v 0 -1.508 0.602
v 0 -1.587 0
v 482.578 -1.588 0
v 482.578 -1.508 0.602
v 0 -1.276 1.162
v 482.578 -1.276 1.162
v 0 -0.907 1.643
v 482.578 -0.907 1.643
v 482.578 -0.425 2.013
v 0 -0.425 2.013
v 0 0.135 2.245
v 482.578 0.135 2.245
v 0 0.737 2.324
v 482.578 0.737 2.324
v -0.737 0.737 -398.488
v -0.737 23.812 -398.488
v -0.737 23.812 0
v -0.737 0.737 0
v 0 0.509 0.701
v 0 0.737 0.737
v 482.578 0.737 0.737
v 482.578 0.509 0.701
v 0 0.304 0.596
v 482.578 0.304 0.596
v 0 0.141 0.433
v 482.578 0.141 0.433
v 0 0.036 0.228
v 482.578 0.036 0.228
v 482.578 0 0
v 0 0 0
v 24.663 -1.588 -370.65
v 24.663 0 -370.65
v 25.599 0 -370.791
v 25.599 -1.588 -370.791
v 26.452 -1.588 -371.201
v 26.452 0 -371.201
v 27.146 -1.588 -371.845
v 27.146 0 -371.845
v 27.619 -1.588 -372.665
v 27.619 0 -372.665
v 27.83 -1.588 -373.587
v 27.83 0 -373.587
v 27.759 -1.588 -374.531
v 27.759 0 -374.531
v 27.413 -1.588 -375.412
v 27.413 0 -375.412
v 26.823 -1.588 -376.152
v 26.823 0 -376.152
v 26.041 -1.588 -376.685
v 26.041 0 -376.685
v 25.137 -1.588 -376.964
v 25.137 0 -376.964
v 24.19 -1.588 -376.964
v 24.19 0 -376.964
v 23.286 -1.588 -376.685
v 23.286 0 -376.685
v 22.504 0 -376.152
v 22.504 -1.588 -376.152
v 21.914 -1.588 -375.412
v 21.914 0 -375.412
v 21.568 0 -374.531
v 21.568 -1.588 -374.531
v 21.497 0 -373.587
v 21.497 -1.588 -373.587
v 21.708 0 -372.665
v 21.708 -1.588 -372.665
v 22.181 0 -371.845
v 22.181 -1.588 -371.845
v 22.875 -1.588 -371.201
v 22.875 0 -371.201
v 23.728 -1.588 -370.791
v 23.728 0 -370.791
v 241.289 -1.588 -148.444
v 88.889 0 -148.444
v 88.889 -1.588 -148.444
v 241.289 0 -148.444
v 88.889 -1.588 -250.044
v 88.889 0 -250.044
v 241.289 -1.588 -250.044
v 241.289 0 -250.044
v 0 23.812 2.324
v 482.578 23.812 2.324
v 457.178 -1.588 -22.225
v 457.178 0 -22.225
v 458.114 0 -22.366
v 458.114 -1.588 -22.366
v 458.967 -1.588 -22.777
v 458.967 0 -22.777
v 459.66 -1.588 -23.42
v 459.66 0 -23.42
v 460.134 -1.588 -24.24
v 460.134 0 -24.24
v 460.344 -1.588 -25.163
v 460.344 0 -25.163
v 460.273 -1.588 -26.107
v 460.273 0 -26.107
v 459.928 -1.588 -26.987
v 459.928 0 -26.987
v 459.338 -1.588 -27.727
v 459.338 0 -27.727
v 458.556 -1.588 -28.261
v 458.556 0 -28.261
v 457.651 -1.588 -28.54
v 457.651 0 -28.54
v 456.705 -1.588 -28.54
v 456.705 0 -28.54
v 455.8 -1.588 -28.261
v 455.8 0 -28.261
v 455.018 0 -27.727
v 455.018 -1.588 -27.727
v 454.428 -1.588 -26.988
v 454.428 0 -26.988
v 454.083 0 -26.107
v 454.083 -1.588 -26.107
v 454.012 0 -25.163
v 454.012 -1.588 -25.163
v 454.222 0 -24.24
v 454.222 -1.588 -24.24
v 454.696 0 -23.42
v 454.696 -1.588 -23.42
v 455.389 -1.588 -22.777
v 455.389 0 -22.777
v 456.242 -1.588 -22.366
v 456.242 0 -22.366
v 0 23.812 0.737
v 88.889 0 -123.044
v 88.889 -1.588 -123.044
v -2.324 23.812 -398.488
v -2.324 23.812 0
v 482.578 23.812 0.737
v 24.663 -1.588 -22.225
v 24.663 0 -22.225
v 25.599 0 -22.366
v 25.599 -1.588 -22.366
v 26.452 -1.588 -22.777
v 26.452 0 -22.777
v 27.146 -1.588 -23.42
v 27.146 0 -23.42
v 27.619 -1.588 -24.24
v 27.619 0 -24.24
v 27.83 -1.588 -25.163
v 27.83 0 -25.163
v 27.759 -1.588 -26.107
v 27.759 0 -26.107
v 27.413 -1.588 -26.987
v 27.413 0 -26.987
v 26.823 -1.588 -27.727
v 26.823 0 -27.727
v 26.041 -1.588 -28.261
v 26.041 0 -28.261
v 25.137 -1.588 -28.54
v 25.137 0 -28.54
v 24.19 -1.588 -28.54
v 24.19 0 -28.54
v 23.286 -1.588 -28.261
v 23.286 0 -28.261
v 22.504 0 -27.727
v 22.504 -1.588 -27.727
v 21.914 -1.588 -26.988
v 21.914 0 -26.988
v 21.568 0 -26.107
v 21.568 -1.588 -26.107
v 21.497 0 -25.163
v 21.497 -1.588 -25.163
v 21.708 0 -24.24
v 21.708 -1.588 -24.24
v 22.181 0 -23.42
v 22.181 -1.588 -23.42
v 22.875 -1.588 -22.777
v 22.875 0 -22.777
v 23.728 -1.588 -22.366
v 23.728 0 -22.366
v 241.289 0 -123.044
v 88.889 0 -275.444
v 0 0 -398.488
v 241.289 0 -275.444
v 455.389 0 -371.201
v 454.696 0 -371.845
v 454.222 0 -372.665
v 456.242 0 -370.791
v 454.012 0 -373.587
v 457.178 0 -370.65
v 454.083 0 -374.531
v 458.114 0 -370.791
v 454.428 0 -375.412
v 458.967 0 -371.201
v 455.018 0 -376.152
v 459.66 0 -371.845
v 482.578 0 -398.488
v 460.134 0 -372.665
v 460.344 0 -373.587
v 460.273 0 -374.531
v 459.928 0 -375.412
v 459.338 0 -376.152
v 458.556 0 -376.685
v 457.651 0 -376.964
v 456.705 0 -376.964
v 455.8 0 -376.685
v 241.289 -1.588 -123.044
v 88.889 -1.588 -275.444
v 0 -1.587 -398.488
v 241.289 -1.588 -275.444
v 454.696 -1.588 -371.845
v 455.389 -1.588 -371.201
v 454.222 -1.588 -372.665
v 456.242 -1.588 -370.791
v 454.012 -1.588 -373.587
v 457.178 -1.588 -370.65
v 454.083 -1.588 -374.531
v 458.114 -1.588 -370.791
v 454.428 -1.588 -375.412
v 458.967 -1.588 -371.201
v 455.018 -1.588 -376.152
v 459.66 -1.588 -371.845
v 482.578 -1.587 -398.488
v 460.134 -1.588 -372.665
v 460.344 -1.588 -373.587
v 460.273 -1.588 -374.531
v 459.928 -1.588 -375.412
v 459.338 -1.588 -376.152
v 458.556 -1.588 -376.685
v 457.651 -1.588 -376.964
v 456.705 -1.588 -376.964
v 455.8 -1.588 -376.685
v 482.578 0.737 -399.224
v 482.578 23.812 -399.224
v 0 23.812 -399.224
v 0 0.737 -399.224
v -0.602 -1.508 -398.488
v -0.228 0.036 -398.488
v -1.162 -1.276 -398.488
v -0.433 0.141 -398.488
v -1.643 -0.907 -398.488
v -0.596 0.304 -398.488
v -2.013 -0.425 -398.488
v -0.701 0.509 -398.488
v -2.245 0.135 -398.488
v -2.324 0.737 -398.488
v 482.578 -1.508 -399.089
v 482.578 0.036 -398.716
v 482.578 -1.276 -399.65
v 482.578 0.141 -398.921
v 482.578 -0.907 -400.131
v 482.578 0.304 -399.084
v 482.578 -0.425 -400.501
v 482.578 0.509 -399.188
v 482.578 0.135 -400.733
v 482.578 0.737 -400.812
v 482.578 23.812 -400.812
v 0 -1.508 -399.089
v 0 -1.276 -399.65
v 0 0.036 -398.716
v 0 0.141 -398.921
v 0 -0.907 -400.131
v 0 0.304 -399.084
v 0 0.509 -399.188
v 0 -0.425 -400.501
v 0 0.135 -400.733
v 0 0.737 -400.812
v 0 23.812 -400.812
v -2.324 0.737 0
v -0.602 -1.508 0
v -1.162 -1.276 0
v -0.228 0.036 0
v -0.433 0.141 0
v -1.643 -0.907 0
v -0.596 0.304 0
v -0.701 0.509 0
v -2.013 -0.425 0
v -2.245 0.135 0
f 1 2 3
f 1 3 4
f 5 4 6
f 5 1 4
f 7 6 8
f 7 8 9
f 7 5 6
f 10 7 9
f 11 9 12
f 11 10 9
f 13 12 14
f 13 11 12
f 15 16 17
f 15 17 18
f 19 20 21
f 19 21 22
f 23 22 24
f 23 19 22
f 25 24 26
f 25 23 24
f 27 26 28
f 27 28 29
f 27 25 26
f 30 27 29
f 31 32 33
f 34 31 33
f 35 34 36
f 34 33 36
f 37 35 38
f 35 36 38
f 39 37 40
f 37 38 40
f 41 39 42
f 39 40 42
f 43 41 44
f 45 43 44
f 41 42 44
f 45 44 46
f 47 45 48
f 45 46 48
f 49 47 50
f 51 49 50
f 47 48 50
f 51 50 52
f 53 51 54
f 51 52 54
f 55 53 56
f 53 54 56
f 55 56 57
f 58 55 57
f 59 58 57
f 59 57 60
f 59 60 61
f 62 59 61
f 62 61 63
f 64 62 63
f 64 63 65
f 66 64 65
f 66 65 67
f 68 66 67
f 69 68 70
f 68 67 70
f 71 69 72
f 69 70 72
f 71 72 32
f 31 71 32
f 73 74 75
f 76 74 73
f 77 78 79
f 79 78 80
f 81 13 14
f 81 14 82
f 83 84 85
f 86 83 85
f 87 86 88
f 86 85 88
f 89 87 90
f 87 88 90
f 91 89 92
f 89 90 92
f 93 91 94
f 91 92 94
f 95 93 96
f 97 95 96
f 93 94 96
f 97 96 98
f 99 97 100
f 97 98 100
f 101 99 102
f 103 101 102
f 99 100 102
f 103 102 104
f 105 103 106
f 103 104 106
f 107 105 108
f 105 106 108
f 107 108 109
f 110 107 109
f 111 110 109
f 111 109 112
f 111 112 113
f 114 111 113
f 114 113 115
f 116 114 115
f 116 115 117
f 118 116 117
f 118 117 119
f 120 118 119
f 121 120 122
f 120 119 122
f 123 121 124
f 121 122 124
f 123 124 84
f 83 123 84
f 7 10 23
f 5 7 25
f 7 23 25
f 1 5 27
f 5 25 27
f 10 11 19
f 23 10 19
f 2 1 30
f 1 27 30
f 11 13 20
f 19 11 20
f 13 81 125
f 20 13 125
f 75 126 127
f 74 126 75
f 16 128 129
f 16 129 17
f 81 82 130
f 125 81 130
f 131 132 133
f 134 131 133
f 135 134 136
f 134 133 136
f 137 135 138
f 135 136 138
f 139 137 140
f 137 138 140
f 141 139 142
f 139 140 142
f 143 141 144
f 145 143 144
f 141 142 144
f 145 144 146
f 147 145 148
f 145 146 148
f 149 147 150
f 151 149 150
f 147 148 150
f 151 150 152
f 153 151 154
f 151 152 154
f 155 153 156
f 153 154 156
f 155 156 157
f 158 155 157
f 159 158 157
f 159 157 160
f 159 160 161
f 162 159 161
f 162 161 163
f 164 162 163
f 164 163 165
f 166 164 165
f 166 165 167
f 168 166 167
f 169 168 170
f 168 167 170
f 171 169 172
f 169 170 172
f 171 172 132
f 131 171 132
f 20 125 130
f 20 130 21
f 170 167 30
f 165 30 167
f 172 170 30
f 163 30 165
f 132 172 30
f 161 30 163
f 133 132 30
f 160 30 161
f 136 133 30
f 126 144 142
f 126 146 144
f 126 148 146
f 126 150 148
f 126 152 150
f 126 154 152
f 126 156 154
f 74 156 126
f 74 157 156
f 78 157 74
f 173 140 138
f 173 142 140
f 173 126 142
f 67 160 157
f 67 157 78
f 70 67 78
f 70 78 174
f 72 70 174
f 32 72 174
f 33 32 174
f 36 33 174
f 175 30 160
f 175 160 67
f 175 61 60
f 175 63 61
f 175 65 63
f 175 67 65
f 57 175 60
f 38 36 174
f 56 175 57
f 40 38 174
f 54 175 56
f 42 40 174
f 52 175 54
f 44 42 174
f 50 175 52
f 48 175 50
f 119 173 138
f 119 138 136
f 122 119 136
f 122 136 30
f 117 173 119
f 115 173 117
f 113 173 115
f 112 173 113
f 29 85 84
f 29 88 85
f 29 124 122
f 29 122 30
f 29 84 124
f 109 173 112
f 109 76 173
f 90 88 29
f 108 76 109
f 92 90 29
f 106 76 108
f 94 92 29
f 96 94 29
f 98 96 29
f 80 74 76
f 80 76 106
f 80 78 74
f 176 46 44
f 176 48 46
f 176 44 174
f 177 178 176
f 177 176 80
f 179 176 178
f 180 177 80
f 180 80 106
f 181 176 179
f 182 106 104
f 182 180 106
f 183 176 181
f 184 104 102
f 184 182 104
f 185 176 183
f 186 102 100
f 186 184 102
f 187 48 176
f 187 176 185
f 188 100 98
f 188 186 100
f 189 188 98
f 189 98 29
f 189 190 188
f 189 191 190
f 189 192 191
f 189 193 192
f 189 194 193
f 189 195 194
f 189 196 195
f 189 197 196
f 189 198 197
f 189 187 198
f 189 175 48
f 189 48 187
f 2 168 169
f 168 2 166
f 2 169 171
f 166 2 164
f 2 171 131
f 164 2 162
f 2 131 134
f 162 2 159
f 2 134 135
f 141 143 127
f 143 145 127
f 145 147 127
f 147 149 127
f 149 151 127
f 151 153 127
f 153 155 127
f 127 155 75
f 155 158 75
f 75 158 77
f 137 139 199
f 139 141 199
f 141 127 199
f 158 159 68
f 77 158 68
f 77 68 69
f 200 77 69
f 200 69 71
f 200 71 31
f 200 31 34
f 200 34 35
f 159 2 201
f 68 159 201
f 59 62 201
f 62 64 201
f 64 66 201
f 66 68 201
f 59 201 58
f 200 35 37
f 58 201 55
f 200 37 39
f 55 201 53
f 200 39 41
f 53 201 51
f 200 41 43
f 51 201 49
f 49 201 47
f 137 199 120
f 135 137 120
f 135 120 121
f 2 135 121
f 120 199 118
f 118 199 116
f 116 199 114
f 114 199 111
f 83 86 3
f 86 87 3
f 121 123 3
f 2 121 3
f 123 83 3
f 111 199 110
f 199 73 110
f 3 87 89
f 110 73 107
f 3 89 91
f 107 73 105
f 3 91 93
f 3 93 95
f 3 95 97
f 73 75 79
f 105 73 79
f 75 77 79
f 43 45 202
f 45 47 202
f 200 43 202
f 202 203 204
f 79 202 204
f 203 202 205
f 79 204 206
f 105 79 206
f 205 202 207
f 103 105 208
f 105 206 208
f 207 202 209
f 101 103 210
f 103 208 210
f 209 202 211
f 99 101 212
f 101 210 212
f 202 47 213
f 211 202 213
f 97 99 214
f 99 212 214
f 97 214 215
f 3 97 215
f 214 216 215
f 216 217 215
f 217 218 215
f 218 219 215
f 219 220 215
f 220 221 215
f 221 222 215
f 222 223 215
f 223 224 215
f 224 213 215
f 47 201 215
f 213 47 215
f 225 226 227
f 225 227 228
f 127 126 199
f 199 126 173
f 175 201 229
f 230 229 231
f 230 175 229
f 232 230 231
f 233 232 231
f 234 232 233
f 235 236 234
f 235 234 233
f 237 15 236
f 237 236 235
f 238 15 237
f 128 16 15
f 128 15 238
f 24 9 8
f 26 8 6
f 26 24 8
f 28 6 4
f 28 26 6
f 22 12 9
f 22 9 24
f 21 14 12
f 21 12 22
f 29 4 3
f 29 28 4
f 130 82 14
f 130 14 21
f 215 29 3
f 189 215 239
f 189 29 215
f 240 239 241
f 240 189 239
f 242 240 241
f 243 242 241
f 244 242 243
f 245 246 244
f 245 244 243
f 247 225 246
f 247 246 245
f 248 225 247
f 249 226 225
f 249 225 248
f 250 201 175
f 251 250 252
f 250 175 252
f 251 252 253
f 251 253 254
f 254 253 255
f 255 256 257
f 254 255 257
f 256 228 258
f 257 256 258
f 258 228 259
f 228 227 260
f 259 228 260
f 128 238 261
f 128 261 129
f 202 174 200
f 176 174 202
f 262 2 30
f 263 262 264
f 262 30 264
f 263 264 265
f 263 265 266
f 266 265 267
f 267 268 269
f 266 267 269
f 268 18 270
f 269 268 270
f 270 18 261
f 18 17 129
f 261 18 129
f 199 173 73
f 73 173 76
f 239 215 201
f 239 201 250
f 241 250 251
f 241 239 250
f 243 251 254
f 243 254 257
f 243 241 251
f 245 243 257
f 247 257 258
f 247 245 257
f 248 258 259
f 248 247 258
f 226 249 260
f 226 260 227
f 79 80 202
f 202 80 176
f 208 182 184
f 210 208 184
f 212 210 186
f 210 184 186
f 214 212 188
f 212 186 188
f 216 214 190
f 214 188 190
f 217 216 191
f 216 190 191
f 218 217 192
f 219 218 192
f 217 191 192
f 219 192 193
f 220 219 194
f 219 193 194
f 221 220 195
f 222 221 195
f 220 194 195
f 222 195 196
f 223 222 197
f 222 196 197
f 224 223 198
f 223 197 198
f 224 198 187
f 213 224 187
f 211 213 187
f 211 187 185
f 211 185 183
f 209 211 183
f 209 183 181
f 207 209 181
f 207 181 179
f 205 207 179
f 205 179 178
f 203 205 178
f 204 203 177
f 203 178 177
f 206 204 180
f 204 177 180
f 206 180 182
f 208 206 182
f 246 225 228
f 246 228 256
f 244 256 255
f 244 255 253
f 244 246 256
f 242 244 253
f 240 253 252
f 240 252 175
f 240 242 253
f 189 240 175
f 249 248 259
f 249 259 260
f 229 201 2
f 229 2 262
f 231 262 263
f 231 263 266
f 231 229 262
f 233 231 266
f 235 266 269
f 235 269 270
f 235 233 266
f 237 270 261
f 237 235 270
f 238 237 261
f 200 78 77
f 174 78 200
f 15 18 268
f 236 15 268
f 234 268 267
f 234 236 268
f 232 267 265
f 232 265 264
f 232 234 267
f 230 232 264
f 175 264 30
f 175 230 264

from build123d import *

# Parameters (mm, degrees)
SKETCH3_W          = 482.5780122
SKETCH3_H          = 398.4879
BASE_FLANGE1_DEPTH = 1.5875
EDGE_FLANGE1_DEPTH = 482.5780122
EDGE_FLANGE2_DEPTH = 482.5780122
EDGE_FLANGE4_DEPTH = 398.4879
SKETCH20_W         = 152.4
SKETCH20_H         = 25.4
CUT_EXTRUDE1_DEPTH = 1.5875
SKETCH21_R         = 3.175
CUT_EXTRUDE2_DEPTH = 1.5875


# Sheet-metal steps are written as plain solids
with BuildPart() as part:
    # Sketch3 → Base-Flange1 (new body)
    with BuildSketch(Plane(origin=(0, 0, 0), x_dir=(1, 0, 0), z_dir=(0, 1, 0))):
        with Locations((241.2890061, 199.24395)):
            Rectangle(SKETCH3_W, SKETCH3_H)
    extrude(amount=-BASE_FLANGE1_DEPTH)

    # Edge-Flange1 section (across the edge) → Edge-Flange1 (add)
    with BuildSketch(Plane(origin=(0, 0, 0.7366), x_dir=(0, 0, -1), z_dir=(1, 0, 0))):
        with BuildLine():
            Line((-1.5875, 0.7366), (-1.5875, 23.8125))
            Line((-1.5875, 23.8125), (0, 23.8125))
            Line((0, 23.8125), (0, 0.7366))
            ThreePointArc((0, 0.7366), (0.215745145, 0.215745145), (0.7366, 0))
            Line((0.7366, 0), (0.7366, -1.5875))
            ThreePointArc((0.7366, -1.5875), (-0.90678687, -0.90678687), (-1.5875, 0.7366))
        make_face()
    extrude(amount=EDGE_FLANGE1_DEPTH)

    # Edge-Flange2 section (across the edge) → Edge-Flange2 (add)
    with BuildSketch(Plane(origin=(482.5780122, 0, -399.2245), x_dir=(0, 0, 1), z_dir=(-1, 0, 0))):
        with BuildLine():
            Line((-1.5875, 0.7366), (-1.5875, 23.8125))
            Line((-1.5875, 23.8125), (0, 23.8125))
            Line((0, 23.8125), (0, 0.7366))
            ThreePointArc((0, 0.7366), (0.215745145, 0.215745145), (0.7366, 0))
            Line((0.7366, 0), (0.7366, -1.5875))
            ThreePointArc((0.7366, -1.5875), (-0.90678687, -0.90678687), (-1.5875, 0.7366))
        make_face()
    extrude(amount=EDGE_FLANGE2_DEPTH)

    # Edge-Flange4 section (across the edge) → Edge-Flange4 (add)
    with BuildSketch(Plane(origin=(-0.7366, 0, -398.4879), x_dir=(1, 0, 0), z_dir=(0, 0, 1))):
        with BuildLine():
            Line((-1.5875, 0.7366), (-1.5875, 23.8125))
            Line((-1.5875, 23.8125), (0, 23.8125))
            Line((0, 23.8125), (0, 0.7366))
            ThreePointArc((0, 0.7366), (0.215745145, 0.215745145), (0.7366, 0))
            Line((0.7366, 0), (0.7366, -1.5875))
            ThreePointArc((0.7366, -1.5875), (-0.90678687, -0.90678687), (-1.5875, 0.7366))
        make_face()
    extrude(amount=EDGE_FLANGE4_DEPTH)

    # Sketch20 → Cut-Extrude1 (cut)
    with BuildSketch(Plane(origin=(0, 0, 0), x_dir=(1, 0, 0), z_dir=(0, 1, 0))):
        with Locations((165.0890061, 135.74395)):
            Rectangle(SKETCH20_W, SKETCH20_H)
        with Locations((165.0890061, 262.74395)):
            Rectangle(SKETCH20_W, SKETCH20_H)
    extrude(amount=-CUT_EXTRUDE1_DEPTH, mode=Mode.SUBTRACT)

    # Sketch21 → Cut-Extrude2 (cut)
    with BuildSketch(Plane(origin=(0, 0, 0), x_dir=(1, 0, 0), z_dir=(0, 1, 0))):
        with Locations(Location((24.6634, 373.8245, 0), (0, 0, 270))):
            Circle(SKETCH21_R)
        with Locations(Location((457.1780122, 373.8245, 0), (0, 0, 270))):
            Circle(SKETCH21_R)
        with Locations(Location((457.1780122, 25.4, 0), (0, 0, 270))):
            Circle(SKETCH21_R)
        with Locations(Location((24.6634, 25.4, 0), (0, 0, 270))):
            Circle(SKETCH21_R)
    extrude(amount=-CUT_EXTRUDE2_DEPTH, mode=Mode.SUBTRACT)


solid = part.part
